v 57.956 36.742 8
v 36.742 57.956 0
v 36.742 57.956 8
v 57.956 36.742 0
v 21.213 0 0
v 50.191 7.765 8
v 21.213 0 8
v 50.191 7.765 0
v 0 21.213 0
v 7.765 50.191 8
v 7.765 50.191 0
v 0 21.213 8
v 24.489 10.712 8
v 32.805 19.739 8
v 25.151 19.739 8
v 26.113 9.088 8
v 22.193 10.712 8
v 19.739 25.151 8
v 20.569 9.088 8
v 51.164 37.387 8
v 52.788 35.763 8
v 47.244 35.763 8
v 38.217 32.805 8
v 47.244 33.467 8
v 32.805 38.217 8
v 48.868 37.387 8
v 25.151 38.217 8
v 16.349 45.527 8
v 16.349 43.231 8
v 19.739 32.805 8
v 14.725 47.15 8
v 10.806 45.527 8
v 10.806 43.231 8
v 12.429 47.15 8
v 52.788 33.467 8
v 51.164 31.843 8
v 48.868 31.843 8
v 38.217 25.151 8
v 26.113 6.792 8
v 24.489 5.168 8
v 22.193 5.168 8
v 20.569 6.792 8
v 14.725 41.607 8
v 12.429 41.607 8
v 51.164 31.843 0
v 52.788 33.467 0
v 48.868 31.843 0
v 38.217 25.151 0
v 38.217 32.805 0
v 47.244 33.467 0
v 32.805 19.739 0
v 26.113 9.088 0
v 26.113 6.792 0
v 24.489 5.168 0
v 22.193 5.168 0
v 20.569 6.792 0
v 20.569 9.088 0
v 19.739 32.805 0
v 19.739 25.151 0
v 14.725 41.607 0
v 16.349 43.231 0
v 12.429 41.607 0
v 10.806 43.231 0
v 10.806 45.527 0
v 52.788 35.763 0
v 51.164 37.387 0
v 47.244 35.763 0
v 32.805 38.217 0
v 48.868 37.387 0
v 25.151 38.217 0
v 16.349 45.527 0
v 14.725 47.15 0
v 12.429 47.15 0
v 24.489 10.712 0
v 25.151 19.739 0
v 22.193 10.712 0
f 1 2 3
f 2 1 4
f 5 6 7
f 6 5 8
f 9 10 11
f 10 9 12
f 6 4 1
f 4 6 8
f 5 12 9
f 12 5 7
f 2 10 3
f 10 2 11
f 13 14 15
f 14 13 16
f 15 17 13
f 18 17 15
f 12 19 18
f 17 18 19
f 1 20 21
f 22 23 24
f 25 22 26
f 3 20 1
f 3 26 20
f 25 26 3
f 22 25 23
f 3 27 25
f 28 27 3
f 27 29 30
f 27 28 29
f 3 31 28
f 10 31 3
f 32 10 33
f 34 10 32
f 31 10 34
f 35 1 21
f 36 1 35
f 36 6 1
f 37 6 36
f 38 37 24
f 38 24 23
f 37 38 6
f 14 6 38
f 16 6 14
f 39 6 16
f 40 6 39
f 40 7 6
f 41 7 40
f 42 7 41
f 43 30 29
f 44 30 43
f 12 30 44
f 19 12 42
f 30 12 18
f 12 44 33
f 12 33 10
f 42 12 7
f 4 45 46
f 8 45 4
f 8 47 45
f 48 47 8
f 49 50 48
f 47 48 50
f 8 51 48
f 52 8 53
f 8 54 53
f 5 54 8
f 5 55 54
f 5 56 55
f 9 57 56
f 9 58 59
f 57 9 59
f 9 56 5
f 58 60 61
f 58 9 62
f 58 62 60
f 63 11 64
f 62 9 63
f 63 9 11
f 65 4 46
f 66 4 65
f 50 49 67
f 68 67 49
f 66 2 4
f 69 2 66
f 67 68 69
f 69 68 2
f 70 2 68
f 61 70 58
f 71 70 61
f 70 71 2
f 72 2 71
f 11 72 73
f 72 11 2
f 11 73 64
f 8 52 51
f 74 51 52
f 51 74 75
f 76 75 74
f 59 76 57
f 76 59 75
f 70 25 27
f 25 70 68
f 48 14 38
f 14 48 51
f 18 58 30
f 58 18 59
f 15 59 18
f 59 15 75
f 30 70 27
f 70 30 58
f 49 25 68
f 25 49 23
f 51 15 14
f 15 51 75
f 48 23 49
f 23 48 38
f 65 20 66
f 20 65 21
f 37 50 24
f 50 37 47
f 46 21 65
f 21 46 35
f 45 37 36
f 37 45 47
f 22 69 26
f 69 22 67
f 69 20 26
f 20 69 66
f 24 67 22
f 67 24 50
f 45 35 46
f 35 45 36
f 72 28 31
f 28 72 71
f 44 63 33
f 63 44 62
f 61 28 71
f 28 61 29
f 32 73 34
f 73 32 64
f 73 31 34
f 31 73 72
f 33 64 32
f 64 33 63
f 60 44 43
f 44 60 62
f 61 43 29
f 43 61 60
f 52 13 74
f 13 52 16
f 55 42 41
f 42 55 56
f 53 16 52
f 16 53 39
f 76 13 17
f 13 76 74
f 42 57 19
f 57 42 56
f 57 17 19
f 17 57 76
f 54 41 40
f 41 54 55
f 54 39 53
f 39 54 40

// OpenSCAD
$fn = 32;

// ----------------------------------------------------------------------
// Polygon plate: 6-gon R30, 3 bolt windows
// ----------------------------------------------------------------------

// --- parameters (mm) ---
sides = 6;                // number of polygon sides
plate_r = 30;             // circumscribed radius of the polygon
bore_r = 10;              // centre bore radius
bolts = 3;                // number of bolt windows
ring_r = 21.78;           // bolt-circle radius
bolt_r = 3;               // bolt window radius
plate_t = 8;              // plate thickness, Z (extrusion height)

plate_d = 2 * plate_r;  // circumscribed diameter
bore_d = 2 * bore_r;  // centre bore diameter
bolt_d = 2 * bolt_r;  // bolt window diameter
ring_d = 2 * ring_r;  // bolt-circle diameter

profile = [[57.956, 36.742], [36.742, 57.956], [7.765, 50.191], [0, 21.213], [21.213, 0], [50.191, 7.765]];  // primary outline, 6 points, counter clockwise
void_1 = [[38.217, 32.805], [32.805, 38.217], [25.151, 38.217], [19.739, 32.805], [19.739, 25.151], [25.151, 19.739], [32.805, 19.739], [38.217, 25.151]];  // centre bore, 8 points
void_2 = [[52.788, 35.763], [51.164, 37.387], [48.868, 37.387], [47.244, 35.763], [47.244, 33.467], [48.868, 31.843], [51.164, 31.843], [52.788, 33.467]];  // bolt window 1, 8 points
void_3 = [[16.349, 45.527], [14.725, 47.15], [12.429, 47.15], [10.806, 45.527], [10.806, 43.231], [12.429, 41.607], [14.725, 41.607], [16.349, 43.231]];  // bolt window 2, 8 points
void_4 = [[26.113, 9.088], [24.489, 10.712], [22.193, 10.712], [20.569, 9.088], [20.569, 6.792], [22.193, 5.168], [24.489, 5.168], [26.113, 6.792]];  // bolt window 3, 8 points

// --- the one profile operation ---
difference() {
  linear_extrude(height = plate_t) polygon(points = profile);
  translate([0, 0, -1])
    linear_extrude(height = plate_t + 2) polygon(points = void_1);
  translate([0, 0, -1])
    linear_extrude(height = plate_t + 2) polygon(points = void_2);
  translate([0, 0, -1])
    linear_extrude(height = plate_t + 2) polygon(points = void_3);
  translate([0, 0, -1])
    linear_extrude(height = plate_t + 2) polygon(points = void_4);
}
